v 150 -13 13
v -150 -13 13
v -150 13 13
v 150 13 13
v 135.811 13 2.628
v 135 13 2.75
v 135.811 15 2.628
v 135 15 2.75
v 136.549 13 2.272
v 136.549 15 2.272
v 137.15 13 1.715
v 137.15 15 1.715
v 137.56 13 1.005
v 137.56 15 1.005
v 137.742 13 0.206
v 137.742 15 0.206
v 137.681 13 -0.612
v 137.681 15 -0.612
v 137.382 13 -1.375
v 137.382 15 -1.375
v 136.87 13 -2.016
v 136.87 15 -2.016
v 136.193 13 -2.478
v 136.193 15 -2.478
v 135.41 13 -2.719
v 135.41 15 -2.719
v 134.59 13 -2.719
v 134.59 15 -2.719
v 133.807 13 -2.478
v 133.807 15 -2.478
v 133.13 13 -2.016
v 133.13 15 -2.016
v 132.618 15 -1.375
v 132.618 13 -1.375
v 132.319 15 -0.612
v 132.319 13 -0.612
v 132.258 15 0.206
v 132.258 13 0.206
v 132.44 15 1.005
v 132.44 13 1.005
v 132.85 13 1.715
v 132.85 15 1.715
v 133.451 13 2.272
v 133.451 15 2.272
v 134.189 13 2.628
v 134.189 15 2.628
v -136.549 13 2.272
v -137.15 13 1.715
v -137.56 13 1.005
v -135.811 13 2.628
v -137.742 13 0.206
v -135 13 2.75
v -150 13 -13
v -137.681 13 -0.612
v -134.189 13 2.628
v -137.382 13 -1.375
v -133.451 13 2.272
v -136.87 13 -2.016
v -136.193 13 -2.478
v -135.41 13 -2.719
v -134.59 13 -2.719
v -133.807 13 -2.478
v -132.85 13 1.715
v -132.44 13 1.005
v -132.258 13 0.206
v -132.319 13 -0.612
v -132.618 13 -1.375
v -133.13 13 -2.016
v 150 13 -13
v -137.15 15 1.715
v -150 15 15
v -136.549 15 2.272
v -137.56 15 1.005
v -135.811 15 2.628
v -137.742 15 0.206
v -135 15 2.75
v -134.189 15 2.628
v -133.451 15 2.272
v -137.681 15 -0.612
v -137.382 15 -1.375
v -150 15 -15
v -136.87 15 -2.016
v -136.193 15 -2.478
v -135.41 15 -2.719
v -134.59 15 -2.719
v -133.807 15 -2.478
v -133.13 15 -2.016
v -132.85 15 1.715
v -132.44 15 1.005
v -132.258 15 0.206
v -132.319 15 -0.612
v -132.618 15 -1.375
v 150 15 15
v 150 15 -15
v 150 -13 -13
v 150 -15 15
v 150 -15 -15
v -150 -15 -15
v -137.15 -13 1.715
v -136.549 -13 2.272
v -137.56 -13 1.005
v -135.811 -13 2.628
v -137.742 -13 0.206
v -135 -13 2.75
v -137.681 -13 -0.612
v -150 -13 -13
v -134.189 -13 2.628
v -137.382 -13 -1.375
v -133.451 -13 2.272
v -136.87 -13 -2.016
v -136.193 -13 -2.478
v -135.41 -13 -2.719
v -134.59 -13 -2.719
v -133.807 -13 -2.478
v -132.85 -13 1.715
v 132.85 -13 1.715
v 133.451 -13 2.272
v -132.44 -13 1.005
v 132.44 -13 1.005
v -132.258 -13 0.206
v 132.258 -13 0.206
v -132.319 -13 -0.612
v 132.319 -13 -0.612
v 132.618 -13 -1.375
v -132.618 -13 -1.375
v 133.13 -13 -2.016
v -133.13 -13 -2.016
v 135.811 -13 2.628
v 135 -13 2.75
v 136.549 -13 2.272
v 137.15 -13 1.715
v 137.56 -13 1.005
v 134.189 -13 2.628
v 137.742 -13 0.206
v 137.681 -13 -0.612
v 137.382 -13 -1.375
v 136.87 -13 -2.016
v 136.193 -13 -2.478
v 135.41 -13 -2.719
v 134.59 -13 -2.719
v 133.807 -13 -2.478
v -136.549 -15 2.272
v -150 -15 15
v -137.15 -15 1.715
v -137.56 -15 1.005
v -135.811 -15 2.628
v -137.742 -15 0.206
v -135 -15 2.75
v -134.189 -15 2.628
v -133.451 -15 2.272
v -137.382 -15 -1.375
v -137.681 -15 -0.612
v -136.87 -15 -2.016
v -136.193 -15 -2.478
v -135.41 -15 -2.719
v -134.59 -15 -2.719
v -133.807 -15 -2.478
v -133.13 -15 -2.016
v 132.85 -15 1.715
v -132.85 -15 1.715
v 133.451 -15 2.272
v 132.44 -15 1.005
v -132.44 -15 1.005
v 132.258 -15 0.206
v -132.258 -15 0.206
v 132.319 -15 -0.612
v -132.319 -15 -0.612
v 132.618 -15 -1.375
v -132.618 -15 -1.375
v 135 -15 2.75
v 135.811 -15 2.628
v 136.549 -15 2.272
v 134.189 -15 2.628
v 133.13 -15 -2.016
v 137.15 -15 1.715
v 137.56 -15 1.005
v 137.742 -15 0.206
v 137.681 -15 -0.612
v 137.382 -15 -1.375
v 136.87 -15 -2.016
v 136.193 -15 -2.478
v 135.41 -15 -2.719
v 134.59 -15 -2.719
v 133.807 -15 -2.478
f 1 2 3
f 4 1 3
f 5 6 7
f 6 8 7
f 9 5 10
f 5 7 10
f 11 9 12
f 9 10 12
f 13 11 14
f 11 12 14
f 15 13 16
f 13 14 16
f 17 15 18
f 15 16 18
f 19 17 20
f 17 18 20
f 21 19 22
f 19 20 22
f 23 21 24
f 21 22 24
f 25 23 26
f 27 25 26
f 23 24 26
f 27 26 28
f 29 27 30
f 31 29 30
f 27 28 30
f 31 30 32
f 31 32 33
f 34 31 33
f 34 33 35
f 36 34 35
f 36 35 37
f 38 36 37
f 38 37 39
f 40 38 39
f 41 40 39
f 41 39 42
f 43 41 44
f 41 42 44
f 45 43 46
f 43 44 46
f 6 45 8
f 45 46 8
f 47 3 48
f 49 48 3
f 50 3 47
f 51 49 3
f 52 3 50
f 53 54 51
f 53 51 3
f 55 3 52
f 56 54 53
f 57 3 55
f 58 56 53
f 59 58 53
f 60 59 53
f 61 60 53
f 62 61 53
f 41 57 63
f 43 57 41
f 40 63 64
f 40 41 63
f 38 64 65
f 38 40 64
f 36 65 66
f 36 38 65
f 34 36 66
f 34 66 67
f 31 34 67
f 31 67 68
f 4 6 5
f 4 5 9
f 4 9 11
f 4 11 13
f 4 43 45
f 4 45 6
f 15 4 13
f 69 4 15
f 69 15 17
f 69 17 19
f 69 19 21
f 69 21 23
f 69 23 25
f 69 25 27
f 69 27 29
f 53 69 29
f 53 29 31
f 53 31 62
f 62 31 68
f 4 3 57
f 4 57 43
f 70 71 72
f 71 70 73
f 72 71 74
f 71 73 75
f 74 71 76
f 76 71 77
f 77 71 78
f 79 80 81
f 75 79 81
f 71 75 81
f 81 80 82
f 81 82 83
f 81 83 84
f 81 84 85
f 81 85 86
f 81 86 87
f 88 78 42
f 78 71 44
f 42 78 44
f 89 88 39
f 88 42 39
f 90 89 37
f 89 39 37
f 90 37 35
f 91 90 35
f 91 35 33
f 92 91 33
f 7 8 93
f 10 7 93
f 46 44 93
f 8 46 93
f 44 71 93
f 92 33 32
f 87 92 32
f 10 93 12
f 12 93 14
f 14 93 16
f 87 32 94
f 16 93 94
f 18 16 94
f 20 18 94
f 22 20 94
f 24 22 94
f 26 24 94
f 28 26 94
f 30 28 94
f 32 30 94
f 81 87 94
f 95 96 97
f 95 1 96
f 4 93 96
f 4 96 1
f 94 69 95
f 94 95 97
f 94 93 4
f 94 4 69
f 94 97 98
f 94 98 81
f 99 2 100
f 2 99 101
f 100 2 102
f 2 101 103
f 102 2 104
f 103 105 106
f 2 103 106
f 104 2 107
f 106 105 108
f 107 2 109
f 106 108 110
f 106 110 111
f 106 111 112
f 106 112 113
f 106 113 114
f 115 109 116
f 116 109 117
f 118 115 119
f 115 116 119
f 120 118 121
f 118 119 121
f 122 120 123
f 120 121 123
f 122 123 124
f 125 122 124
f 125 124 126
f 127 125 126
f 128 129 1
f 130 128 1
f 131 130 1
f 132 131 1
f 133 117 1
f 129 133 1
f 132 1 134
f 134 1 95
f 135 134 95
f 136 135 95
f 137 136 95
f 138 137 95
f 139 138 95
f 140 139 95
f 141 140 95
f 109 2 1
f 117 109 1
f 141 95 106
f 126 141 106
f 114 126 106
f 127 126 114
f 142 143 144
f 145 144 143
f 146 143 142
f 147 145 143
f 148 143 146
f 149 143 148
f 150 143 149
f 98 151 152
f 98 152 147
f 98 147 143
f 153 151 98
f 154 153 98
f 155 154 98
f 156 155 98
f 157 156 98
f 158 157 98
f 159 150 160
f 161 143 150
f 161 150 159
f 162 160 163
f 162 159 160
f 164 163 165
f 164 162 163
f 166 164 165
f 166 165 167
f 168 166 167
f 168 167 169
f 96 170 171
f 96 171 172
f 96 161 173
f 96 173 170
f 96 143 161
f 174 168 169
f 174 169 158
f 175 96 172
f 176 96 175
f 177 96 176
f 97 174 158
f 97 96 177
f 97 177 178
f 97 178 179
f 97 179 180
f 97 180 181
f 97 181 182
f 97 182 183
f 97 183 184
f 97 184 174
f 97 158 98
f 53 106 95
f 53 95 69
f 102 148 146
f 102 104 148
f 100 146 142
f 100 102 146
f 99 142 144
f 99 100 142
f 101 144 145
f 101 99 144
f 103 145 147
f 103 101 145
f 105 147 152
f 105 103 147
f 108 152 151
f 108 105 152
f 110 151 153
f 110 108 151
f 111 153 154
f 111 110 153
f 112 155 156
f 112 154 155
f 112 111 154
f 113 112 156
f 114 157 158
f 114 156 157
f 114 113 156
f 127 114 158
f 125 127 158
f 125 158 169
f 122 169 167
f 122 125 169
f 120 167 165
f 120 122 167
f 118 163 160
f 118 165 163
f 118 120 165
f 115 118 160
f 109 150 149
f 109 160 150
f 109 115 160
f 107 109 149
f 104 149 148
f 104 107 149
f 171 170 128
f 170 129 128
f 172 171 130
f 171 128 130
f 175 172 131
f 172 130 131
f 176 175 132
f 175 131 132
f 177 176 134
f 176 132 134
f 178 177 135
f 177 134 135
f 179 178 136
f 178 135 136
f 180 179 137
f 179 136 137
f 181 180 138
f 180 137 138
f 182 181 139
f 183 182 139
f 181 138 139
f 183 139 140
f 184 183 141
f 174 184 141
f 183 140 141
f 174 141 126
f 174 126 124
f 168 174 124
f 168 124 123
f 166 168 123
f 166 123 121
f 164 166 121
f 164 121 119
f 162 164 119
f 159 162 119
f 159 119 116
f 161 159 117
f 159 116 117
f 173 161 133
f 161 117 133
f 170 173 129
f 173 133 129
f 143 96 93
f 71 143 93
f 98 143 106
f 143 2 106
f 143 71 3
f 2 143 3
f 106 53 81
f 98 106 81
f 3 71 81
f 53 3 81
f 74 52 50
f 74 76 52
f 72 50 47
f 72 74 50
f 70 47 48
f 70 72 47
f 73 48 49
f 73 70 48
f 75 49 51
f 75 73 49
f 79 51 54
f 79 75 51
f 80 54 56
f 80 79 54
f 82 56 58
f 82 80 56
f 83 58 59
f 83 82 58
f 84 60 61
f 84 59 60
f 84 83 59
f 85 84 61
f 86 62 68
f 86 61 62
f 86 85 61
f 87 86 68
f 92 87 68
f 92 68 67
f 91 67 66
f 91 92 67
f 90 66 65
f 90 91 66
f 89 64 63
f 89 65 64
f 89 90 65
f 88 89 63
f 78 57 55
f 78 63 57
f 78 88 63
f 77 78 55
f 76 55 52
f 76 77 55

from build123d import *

# Parameters (mm, degrees)
SKETCH1_W           = 30
SKETCH1_H           = 30
SKETCH1_W_2         = 26
SKETCH1_H_2         = 26
BOSS_EXTRUDE1_DEPTH = 150
SKETCH2_R           = 2.75
CUT_EXTRUDE1_DEPTH  = 152.492574075


with BuildPart() as part:
    # Sketch1 → Boss-Extrude1 (new, symmetric)
    with BuildSketch(Plane(origin=(0, 0, 0), x_dir=(0, 0, -1), z_dir=(1, 0, 0))):
        Rectangle(SKETCH1_W, SKETCH1_H)
        Rectangle(SKETCH1_W_2, SKETCH1_H_2, mode=Mode.SUBTRACT)
    extrude(amount=BOSS_EXTRUDE1_DEPTH, both=True)

    # Sketch2 → Cut-Extrude1 (cut, symmetric)
    with BuildSketch(Plane(origin=(0, 0, 0), x_dir=(1, 0, 0), z_dir=(0, 1, 0))):
        with Locations(Location((135, 0, 0), (0, 0, 270))):
            Circle(SKETCH2_R)
    cut_extrude1 = extrude(amount=CUT_EXTRUDE1_DEPTH, both=True, mode=Mode.SUBTRACT)

    # Mirror1: Cut-Extrude1 across plane
    add(cut_extrude1.mirror(Plane(origin=(0, 0, 0), x_dir=(0, 0, 1), z_dir=(1, 0, 0))), mode=Mode.SUBTRACT)


solid = part.part
